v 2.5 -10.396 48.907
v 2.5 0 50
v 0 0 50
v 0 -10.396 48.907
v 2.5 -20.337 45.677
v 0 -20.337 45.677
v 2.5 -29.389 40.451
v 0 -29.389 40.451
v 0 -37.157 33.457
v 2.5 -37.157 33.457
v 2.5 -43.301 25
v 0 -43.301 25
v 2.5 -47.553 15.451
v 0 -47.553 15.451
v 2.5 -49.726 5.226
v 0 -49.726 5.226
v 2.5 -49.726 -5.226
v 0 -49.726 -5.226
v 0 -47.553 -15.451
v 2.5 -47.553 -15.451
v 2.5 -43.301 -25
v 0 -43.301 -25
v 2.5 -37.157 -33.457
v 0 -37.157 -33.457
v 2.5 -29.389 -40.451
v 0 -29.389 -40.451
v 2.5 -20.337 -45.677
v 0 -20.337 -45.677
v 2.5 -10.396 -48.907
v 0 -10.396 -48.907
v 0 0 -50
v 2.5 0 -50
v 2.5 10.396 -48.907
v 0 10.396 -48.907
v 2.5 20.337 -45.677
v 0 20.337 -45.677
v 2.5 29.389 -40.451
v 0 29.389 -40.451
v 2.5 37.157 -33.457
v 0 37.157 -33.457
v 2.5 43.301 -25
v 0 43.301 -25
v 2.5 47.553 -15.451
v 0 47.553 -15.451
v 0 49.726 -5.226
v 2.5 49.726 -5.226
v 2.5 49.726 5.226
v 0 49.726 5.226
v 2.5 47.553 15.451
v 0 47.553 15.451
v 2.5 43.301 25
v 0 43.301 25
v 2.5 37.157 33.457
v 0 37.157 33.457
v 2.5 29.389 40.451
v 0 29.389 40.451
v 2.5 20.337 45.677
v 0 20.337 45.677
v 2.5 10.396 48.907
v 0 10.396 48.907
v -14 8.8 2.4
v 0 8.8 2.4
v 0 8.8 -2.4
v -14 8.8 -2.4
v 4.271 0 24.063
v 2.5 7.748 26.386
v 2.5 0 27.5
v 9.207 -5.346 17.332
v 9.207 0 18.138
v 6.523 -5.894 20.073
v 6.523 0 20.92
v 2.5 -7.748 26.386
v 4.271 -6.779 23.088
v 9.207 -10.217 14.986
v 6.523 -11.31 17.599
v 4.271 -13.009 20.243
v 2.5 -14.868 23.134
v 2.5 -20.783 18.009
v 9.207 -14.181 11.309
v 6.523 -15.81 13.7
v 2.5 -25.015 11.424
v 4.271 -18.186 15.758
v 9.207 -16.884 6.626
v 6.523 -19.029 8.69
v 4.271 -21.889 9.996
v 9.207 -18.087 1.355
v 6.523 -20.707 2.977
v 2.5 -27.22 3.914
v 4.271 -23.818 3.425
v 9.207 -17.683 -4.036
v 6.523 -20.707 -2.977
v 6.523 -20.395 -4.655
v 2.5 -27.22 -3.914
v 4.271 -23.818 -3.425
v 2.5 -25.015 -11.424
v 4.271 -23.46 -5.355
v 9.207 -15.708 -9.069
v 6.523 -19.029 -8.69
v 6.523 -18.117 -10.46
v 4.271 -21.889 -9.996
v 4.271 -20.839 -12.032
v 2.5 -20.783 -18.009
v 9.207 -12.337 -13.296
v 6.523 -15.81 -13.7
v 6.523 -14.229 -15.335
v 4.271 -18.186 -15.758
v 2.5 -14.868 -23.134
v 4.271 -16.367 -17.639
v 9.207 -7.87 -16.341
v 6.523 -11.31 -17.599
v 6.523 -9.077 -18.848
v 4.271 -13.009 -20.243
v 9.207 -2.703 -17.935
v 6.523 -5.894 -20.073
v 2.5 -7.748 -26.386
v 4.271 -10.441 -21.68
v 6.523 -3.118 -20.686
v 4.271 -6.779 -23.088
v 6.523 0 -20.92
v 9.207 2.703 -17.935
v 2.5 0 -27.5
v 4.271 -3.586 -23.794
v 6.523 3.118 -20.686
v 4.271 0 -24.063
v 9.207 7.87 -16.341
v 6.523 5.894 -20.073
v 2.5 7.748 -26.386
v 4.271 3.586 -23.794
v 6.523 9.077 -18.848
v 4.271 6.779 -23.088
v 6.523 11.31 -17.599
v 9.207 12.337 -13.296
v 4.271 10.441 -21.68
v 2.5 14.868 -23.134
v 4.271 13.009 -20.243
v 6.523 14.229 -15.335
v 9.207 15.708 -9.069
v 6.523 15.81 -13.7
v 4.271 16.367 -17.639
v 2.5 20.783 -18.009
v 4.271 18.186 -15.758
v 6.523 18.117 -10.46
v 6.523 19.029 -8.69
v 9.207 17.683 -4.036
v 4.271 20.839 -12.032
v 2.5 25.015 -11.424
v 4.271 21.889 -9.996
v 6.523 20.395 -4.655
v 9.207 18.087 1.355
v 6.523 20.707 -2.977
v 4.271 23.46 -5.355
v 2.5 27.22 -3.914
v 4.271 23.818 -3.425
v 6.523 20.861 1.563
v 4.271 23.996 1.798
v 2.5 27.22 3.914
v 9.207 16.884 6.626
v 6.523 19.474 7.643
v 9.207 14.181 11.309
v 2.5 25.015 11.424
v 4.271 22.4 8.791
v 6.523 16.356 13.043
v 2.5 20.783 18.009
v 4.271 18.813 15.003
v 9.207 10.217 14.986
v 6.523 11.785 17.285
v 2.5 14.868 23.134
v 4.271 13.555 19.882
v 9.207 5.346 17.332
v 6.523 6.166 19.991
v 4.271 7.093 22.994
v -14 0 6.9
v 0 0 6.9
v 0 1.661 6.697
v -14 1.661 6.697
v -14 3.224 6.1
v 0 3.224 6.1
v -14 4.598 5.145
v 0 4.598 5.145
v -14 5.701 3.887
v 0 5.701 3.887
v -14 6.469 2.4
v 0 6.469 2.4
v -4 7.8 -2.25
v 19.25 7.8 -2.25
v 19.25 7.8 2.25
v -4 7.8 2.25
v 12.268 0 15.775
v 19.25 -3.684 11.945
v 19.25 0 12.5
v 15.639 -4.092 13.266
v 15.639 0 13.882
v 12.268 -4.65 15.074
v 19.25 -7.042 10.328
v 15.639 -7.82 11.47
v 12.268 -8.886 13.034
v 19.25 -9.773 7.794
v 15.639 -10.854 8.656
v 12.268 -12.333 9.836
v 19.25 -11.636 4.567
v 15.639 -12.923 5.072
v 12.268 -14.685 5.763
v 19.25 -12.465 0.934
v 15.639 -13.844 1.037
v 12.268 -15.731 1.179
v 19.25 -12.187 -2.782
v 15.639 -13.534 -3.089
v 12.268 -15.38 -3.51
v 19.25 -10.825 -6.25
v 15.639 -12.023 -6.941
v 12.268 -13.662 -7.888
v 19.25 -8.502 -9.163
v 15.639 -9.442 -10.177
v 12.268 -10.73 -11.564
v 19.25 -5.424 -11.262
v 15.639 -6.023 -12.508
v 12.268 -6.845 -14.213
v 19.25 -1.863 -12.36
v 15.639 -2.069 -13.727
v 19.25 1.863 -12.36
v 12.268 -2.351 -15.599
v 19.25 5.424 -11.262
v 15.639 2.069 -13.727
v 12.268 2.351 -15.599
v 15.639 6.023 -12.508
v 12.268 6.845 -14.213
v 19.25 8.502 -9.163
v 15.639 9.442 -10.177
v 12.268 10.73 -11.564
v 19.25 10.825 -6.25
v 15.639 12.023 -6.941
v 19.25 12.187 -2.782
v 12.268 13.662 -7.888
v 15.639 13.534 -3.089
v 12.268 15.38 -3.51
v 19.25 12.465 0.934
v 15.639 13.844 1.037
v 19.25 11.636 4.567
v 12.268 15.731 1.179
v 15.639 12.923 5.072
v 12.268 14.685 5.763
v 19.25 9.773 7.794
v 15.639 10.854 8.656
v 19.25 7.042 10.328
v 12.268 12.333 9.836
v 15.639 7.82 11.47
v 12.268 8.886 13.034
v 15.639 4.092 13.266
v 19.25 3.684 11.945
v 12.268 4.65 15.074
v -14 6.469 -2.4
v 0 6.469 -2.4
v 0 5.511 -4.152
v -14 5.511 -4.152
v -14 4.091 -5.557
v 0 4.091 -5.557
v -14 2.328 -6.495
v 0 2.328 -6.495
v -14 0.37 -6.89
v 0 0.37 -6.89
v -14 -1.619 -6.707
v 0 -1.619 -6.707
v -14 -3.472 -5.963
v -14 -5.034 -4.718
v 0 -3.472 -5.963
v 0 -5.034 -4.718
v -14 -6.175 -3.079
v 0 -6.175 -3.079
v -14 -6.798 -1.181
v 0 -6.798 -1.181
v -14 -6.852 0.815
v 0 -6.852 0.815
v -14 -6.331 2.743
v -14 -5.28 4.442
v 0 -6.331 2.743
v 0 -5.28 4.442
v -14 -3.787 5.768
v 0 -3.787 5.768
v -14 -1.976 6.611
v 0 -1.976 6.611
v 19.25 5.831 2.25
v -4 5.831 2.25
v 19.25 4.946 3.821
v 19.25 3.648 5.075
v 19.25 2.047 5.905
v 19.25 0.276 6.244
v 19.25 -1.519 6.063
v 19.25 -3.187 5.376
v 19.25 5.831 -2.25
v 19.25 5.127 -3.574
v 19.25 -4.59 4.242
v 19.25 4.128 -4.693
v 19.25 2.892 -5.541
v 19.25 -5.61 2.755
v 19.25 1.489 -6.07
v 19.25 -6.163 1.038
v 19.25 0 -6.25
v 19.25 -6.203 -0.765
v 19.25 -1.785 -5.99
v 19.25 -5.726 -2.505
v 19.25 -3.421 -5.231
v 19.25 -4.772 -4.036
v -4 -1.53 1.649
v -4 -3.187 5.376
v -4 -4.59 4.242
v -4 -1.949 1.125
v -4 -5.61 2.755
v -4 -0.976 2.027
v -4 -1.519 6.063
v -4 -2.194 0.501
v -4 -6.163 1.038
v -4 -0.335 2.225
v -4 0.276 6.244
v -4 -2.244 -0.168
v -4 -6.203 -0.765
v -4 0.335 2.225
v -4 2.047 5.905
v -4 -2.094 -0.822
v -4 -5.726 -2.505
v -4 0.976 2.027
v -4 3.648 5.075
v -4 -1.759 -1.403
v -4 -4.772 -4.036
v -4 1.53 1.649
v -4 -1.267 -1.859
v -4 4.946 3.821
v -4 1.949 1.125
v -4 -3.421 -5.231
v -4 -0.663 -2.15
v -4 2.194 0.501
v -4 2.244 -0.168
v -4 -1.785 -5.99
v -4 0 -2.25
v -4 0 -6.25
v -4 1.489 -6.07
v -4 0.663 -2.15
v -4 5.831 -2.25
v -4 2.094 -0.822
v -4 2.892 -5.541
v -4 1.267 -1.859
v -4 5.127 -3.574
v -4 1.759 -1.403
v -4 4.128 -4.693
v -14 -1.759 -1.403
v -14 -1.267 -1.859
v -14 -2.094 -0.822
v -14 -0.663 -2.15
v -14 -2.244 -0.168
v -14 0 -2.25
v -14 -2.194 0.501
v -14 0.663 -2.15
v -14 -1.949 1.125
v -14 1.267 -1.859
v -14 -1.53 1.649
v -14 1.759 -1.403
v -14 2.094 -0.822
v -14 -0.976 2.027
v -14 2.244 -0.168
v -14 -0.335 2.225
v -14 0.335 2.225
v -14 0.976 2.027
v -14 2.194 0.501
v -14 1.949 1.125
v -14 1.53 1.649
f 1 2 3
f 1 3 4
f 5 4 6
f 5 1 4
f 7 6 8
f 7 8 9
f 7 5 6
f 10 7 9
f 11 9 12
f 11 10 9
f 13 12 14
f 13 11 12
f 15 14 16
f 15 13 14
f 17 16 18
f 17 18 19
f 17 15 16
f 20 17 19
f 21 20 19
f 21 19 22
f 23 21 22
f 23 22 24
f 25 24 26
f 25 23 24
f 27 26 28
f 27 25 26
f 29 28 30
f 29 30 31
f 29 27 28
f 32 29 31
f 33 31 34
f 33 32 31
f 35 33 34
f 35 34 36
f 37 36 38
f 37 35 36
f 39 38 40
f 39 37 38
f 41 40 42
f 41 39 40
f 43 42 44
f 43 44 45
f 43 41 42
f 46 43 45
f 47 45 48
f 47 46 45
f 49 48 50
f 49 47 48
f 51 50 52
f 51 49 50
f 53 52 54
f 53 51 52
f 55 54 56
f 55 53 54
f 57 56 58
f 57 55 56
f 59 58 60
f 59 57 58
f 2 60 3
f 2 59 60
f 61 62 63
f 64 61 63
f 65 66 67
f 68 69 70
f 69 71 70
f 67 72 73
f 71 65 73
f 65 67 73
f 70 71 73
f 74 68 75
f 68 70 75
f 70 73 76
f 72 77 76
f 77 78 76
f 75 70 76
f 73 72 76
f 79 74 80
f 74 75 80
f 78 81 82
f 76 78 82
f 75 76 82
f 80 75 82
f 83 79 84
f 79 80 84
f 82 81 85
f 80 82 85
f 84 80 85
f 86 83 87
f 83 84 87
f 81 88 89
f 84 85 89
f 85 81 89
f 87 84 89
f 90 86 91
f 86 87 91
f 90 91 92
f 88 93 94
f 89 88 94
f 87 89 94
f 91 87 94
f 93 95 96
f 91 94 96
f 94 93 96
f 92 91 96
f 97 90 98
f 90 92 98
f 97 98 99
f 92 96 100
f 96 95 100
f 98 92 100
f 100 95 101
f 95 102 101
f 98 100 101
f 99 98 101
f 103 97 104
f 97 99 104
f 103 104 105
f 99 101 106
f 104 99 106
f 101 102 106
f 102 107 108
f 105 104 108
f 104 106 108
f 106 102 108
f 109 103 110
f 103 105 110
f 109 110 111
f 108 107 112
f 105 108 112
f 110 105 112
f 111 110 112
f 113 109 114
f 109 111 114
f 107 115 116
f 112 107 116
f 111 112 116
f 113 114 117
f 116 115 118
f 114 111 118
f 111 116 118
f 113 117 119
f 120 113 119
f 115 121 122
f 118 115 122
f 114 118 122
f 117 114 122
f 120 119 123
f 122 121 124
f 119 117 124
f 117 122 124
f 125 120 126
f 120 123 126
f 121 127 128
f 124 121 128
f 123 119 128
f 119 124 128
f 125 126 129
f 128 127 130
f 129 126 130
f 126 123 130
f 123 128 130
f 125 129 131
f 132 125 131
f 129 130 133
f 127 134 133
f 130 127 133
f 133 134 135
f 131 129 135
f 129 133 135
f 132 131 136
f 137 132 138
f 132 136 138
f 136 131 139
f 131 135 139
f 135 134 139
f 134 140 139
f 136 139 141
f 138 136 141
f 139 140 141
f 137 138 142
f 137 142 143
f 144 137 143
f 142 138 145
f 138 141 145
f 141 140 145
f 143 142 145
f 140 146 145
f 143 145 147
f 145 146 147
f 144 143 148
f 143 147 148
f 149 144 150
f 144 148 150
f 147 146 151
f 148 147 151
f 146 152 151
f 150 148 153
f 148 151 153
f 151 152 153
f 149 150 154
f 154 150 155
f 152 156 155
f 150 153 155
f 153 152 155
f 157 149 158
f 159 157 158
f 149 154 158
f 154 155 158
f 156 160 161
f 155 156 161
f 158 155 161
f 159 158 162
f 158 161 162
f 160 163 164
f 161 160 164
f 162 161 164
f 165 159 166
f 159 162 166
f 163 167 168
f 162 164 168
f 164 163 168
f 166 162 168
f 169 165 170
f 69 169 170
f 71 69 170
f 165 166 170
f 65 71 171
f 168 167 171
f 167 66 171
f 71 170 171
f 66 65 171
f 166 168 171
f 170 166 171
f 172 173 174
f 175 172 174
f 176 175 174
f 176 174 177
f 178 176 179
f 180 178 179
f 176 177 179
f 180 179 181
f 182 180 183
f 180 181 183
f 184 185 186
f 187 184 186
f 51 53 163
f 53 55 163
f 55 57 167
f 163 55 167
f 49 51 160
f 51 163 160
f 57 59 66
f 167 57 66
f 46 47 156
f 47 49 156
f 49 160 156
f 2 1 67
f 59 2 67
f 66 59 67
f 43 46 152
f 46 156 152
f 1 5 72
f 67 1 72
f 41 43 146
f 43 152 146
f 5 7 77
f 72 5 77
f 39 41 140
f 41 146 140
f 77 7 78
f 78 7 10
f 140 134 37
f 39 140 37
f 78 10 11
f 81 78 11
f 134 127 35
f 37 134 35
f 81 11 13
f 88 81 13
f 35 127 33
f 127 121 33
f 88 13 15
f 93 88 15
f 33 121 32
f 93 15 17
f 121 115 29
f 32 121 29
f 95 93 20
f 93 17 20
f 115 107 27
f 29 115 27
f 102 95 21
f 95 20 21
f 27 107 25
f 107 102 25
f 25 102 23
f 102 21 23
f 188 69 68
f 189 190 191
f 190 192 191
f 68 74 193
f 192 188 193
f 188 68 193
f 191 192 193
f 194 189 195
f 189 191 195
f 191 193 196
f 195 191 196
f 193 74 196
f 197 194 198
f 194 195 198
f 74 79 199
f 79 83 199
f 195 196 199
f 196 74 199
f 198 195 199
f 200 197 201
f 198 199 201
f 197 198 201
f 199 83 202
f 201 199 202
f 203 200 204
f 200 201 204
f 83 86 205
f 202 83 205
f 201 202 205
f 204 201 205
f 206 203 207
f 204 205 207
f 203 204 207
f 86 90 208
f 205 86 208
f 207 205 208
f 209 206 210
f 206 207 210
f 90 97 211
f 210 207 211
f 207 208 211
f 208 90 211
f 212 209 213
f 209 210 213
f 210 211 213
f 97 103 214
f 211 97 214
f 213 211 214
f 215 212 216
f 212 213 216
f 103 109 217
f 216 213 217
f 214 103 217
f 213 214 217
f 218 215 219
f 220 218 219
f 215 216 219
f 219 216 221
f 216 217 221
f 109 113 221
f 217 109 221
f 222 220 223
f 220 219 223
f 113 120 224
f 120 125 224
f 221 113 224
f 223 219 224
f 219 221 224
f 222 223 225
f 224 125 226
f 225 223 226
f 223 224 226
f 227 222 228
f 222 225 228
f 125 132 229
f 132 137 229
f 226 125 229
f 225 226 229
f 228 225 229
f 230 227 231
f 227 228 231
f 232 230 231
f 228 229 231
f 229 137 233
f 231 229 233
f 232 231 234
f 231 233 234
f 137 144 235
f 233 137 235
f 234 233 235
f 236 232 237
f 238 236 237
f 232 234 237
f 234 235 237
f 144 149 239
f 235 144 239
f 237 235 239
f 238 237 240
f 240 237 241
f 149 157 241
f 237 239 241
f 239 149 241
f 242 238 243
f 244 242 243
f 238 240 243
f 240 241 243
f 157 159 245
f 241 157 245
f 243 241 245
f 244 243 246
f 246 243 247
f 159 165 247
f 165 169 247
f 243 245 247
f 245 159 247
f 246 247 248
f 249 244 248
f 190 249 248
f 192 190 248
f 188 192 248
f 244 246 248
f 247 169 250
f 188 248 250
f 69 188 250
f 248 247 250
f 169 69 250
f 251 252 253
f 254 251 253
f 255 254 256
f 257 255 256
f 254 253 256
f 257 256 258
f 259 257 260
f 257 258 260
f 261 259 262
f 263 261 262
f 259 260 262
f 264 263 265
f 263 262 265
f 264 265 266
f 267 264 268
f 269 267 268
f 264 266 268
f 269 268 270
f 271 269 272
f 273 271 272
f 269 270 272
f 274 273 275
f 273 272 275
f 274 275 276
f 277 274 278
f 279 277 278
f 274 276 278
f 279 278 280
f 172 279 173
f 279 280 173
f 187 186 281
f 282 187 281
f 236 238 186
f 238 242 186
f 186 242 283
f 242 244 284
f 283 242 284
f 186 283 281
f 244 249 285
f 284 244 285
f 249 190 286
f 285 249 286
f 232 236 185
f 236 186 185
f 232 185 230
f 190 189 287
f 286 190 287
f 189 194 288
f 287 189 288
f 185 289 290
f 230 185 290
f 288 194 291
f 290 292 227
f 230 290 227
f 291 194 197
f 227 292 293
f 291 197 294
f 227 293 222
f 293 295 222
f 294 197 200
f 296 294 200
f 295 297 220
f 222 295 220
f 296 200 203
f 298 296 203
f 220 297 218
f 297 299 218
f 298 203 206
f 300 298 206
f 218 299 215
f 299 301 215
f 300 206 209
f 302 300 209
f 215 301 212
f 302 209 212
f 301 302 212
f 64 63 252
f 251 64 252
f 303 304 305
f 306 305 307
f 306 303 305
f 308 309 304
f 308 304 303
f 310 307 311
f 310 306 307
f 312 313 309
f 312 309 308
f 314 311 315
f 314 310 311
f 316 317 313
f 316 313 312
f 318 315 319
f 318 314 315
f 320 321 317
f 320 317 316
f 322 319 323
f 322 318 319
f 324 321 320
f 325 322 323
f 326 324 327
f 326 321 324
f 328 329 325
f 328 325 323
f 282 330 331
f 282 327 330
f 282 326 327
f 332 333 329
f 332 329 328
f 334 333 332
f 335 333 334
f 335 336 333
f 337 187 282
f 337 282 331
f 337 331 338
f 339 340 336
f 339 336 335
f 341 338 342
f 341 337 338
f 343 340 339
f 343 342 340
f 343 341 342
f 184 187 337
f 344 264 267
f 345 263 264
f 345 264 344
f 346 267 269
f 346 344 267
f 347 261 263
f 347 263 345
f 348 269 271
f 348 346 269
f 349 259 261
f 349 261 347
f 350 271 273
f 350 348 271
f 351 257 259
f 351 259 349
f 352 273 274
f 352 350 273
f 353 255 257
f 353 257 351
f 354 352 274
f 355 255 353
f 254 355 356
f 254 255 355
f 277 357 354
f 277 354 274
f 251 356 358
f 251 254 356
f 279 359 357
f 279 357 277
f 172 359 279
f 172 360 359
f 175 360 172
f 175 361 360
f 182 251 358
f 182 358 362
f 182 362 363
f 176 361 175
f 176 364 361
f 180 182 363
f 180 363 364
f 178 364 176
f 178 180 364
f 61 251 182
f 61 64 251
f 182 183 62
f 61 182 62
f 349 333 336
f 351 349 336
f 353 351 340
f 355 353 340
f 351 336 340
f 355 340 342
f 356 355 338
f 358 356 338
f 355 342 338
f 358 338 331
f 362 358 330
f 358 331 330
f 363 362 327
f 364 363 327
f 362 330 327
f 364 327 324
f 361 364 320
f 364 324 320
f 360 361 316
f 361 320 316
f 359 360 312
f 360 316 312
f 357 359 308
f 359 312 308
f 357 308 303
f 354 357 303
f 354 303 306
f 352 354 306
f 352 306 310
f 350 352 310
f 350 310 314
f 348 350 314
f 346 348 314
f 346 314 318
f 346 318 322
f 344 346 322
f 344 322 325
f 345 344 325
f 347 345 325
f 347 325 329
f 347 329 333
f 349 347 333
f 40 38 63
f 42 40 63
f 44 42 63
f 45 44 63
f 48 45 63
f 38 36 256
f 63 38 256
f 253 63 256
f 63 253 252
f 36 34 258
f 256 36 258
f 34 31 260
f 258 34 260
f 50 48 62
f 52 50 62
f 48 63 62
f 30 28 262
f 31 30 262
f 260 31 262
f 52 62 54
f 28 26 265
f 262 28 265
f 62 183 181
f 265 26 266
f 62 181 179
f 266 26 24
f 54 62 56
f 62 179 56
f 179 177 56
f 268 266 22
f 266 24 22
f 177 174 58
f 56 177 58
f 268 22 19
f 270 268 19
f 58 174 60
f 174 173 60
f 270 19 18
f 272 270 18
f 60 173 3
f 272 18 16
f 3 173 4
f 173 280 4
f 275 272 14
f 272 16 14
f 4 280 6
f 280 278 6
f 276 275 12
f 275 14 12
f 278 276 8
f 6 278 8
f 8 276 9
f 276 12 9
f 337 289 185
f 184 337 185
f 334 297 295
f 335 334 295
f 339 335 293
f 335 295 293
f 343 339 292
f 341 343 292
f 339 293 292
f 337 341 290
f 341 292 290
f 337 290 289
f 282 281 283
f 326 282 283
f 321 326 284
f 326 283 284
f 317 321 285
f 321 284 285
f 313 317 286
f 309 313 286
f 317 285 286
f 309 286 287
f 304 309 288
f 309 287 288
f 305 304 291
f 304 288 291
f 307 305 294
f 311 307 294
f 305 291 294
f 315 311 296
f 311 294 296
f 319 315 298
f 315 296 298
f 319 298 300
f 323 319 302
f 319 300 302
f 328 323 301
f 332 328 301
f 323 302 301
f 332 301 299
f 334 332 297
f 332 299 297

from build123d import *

# Parameters (mm, degrees)
SKETCH1_W           = 2.5
SKETCH1_H           = 22.5
BOSS_EXTRUDE1_DEPTH = 14
CUT_EXTRUDE2_DEPTH  = 23.25
SKETCH6_R           = 2.25
CUT_EXTRUDE3_DEPTH  = 75.434954826
SKETCH7_R           = 50
SKETCH7_R_2         = 12.65
CUT_EXTRUDE6_DEPTH  = 74.284121745


with BuildPart() as part:
    # Sketch1 → Revolve1 (revolve)
    with BuildSketch(Plane.XY, mode=Mode.PRIVATE) as revolve1_sk:
        Polygon((0, 12.65), (0, 0), (19.25, 0), (19.25, 9.144072085), (9.207200807, 18.137623601), (-1.247452839, 27.5), (-3, 27.5), (-3, 12.65), align=None)
        with BuildLine():
            Line((-1.247452839, 27.5), (9.207200807, 18.137623601))
            ThreePointArc((9.207200807, 18.137623601), (5.339394973, 22.45043534), (2.5, 27.5))
            Line((2.5, 27.5), (0, 27.5))
            Line((0, 27.5), (-1.247452839, 27.5))
        make_face()
        with BuildLine():
            Line((9.207200807, 18.137623601), (19.25, 9.144072085))
            Line((19.25, 9.144072085), (19.25, 12.5))
            ThreePointArc((19.25, 12.5), (13.918967856, 14.767235866), (9.207200807, 18.137623601))
        make_face()
        with Locations((1.25, 38.75)):
            Rectangle(SKETCH1_W, SKETCH1_H)
    revolve(revolve1_sk.sketch.rotate(Axis((-75.117650177, 0, 0), (1, 0, 0)), 90), axis=Axis((-75.117650177, 0, 0), (1, 0, 0)))

    # Sketch3 → Boss-Extrude1 (add)
    with BuildSketch(Plane.ZY):
        with BuildLine():
            Line((-2.4, 8.8), (-2.4, 6.469157596))
            ThreePointArc((-2.4, 6.469157596), (0, 6.9), (2.4, 6.469157596))
            Line((2.4, 6.469157596), (2.4, 8.8))
            Line((2.4, 8.8), (-2.4, 8.8))
        make_face()
        with BuildLine():
            Line((-2.4, 6.469157596), (-2.4, 0))
            Line((-2.4, 0), (2.4, 0))
            Line((2.4, 0), (2.4, 6.469157596))
            ThreePointArc((2.4, 6.469157596), (0, 6.9), (-2.4, 6.469157596))
        make_face()
        with BuildLine():
            Line((2.4, 0), (-2.4, 0))
            Line((-2.4, 0), (-2.4, 6.469157596))
            ThreePointArc((-2.4, 6.469157596), (-3.940177661, -5.664362277), (6.9, 0))
            ThreePointArc((6.9, 0), (5.664362277, 3.940177661), (2.4, 6.469157596))
            Line((2.4, 6.469157596), (2.4, 0))
        make_face()
    extrude(amount=BOSS_EXTRUDE1_DEPTH)

    # Sketch5 → Cut-Extrude2 (cut)
    with BuildSketch(Plane(origin=(19.25, 0, 0), x_dir=(0, 0, -1), z_dir=(1, 0, 0))):
        with BuildLine():
            Line((2.25, 7.8), (-2.25, 7.8))
            Line((-2.25, 7.8), (-2.25, 5.830951895))
            ThreePointArc((-2.25, 5.830951895), (0, 6.25), (2.25, 5.830951895))
            Line((2.25, 5.830951895), (2.25, 7.8))
        make_face()
        with BuildLine():
            ThreePointArc((2.25, 5.830951895), (0, 6.25), (-2.25, 5.830951895))
            Line((-2.25, 5.830951895), (-2.25, 0))
            Line((-2.25, 0), (2.25, 0))
            Line((2.25, 0), (2.25, 5.830951895))
        make_face()
        with BuildLine():
            Line((-2.25, 0), (-2.25, 5.830951895))
            ThreePointArc((-2.25, 5.830951895), (-3.535533906, -5.153882032), (6.25, 0))
            ThreePointArc((6.25, 0), (5.153882032, 3.535533906), (2.25, 5.830951895))
            Line((2.25, 5.830951895), (2.25, 0))
            Line((2.25, 0), (-2.25, 0))
        make_face()
    extrude(amount=-CUT_EXTRUDE2_DEPTH, mode=Mode.SUBTRACT)

    # Sketch6 → Cut-Extrude3 (cut, through all)
    with BuildSketch(Plane(origin=(-4, 0, 0), x_dir=(0, 0, -1), z_dir=(1, 0, 0))):
        Circle(SKETCH6_R)
    extrude(amount=-CUT_EXTRUDE3_DEPTH, mode=Mode.SUBTRACT)

    # Sketch7 → Cut-Extrude6 (cut, through all)
    with BuildSketch(Plane.ZY):
        Circle(SKETCH7_R)
        Circle(SKETCH7_R_2, mode=Mode.SUBTRACT)
    extrude(amount=CUT_EXTRUDE6_DEPTH, mode=Mode.SUBTRACT)


solid = part.part
